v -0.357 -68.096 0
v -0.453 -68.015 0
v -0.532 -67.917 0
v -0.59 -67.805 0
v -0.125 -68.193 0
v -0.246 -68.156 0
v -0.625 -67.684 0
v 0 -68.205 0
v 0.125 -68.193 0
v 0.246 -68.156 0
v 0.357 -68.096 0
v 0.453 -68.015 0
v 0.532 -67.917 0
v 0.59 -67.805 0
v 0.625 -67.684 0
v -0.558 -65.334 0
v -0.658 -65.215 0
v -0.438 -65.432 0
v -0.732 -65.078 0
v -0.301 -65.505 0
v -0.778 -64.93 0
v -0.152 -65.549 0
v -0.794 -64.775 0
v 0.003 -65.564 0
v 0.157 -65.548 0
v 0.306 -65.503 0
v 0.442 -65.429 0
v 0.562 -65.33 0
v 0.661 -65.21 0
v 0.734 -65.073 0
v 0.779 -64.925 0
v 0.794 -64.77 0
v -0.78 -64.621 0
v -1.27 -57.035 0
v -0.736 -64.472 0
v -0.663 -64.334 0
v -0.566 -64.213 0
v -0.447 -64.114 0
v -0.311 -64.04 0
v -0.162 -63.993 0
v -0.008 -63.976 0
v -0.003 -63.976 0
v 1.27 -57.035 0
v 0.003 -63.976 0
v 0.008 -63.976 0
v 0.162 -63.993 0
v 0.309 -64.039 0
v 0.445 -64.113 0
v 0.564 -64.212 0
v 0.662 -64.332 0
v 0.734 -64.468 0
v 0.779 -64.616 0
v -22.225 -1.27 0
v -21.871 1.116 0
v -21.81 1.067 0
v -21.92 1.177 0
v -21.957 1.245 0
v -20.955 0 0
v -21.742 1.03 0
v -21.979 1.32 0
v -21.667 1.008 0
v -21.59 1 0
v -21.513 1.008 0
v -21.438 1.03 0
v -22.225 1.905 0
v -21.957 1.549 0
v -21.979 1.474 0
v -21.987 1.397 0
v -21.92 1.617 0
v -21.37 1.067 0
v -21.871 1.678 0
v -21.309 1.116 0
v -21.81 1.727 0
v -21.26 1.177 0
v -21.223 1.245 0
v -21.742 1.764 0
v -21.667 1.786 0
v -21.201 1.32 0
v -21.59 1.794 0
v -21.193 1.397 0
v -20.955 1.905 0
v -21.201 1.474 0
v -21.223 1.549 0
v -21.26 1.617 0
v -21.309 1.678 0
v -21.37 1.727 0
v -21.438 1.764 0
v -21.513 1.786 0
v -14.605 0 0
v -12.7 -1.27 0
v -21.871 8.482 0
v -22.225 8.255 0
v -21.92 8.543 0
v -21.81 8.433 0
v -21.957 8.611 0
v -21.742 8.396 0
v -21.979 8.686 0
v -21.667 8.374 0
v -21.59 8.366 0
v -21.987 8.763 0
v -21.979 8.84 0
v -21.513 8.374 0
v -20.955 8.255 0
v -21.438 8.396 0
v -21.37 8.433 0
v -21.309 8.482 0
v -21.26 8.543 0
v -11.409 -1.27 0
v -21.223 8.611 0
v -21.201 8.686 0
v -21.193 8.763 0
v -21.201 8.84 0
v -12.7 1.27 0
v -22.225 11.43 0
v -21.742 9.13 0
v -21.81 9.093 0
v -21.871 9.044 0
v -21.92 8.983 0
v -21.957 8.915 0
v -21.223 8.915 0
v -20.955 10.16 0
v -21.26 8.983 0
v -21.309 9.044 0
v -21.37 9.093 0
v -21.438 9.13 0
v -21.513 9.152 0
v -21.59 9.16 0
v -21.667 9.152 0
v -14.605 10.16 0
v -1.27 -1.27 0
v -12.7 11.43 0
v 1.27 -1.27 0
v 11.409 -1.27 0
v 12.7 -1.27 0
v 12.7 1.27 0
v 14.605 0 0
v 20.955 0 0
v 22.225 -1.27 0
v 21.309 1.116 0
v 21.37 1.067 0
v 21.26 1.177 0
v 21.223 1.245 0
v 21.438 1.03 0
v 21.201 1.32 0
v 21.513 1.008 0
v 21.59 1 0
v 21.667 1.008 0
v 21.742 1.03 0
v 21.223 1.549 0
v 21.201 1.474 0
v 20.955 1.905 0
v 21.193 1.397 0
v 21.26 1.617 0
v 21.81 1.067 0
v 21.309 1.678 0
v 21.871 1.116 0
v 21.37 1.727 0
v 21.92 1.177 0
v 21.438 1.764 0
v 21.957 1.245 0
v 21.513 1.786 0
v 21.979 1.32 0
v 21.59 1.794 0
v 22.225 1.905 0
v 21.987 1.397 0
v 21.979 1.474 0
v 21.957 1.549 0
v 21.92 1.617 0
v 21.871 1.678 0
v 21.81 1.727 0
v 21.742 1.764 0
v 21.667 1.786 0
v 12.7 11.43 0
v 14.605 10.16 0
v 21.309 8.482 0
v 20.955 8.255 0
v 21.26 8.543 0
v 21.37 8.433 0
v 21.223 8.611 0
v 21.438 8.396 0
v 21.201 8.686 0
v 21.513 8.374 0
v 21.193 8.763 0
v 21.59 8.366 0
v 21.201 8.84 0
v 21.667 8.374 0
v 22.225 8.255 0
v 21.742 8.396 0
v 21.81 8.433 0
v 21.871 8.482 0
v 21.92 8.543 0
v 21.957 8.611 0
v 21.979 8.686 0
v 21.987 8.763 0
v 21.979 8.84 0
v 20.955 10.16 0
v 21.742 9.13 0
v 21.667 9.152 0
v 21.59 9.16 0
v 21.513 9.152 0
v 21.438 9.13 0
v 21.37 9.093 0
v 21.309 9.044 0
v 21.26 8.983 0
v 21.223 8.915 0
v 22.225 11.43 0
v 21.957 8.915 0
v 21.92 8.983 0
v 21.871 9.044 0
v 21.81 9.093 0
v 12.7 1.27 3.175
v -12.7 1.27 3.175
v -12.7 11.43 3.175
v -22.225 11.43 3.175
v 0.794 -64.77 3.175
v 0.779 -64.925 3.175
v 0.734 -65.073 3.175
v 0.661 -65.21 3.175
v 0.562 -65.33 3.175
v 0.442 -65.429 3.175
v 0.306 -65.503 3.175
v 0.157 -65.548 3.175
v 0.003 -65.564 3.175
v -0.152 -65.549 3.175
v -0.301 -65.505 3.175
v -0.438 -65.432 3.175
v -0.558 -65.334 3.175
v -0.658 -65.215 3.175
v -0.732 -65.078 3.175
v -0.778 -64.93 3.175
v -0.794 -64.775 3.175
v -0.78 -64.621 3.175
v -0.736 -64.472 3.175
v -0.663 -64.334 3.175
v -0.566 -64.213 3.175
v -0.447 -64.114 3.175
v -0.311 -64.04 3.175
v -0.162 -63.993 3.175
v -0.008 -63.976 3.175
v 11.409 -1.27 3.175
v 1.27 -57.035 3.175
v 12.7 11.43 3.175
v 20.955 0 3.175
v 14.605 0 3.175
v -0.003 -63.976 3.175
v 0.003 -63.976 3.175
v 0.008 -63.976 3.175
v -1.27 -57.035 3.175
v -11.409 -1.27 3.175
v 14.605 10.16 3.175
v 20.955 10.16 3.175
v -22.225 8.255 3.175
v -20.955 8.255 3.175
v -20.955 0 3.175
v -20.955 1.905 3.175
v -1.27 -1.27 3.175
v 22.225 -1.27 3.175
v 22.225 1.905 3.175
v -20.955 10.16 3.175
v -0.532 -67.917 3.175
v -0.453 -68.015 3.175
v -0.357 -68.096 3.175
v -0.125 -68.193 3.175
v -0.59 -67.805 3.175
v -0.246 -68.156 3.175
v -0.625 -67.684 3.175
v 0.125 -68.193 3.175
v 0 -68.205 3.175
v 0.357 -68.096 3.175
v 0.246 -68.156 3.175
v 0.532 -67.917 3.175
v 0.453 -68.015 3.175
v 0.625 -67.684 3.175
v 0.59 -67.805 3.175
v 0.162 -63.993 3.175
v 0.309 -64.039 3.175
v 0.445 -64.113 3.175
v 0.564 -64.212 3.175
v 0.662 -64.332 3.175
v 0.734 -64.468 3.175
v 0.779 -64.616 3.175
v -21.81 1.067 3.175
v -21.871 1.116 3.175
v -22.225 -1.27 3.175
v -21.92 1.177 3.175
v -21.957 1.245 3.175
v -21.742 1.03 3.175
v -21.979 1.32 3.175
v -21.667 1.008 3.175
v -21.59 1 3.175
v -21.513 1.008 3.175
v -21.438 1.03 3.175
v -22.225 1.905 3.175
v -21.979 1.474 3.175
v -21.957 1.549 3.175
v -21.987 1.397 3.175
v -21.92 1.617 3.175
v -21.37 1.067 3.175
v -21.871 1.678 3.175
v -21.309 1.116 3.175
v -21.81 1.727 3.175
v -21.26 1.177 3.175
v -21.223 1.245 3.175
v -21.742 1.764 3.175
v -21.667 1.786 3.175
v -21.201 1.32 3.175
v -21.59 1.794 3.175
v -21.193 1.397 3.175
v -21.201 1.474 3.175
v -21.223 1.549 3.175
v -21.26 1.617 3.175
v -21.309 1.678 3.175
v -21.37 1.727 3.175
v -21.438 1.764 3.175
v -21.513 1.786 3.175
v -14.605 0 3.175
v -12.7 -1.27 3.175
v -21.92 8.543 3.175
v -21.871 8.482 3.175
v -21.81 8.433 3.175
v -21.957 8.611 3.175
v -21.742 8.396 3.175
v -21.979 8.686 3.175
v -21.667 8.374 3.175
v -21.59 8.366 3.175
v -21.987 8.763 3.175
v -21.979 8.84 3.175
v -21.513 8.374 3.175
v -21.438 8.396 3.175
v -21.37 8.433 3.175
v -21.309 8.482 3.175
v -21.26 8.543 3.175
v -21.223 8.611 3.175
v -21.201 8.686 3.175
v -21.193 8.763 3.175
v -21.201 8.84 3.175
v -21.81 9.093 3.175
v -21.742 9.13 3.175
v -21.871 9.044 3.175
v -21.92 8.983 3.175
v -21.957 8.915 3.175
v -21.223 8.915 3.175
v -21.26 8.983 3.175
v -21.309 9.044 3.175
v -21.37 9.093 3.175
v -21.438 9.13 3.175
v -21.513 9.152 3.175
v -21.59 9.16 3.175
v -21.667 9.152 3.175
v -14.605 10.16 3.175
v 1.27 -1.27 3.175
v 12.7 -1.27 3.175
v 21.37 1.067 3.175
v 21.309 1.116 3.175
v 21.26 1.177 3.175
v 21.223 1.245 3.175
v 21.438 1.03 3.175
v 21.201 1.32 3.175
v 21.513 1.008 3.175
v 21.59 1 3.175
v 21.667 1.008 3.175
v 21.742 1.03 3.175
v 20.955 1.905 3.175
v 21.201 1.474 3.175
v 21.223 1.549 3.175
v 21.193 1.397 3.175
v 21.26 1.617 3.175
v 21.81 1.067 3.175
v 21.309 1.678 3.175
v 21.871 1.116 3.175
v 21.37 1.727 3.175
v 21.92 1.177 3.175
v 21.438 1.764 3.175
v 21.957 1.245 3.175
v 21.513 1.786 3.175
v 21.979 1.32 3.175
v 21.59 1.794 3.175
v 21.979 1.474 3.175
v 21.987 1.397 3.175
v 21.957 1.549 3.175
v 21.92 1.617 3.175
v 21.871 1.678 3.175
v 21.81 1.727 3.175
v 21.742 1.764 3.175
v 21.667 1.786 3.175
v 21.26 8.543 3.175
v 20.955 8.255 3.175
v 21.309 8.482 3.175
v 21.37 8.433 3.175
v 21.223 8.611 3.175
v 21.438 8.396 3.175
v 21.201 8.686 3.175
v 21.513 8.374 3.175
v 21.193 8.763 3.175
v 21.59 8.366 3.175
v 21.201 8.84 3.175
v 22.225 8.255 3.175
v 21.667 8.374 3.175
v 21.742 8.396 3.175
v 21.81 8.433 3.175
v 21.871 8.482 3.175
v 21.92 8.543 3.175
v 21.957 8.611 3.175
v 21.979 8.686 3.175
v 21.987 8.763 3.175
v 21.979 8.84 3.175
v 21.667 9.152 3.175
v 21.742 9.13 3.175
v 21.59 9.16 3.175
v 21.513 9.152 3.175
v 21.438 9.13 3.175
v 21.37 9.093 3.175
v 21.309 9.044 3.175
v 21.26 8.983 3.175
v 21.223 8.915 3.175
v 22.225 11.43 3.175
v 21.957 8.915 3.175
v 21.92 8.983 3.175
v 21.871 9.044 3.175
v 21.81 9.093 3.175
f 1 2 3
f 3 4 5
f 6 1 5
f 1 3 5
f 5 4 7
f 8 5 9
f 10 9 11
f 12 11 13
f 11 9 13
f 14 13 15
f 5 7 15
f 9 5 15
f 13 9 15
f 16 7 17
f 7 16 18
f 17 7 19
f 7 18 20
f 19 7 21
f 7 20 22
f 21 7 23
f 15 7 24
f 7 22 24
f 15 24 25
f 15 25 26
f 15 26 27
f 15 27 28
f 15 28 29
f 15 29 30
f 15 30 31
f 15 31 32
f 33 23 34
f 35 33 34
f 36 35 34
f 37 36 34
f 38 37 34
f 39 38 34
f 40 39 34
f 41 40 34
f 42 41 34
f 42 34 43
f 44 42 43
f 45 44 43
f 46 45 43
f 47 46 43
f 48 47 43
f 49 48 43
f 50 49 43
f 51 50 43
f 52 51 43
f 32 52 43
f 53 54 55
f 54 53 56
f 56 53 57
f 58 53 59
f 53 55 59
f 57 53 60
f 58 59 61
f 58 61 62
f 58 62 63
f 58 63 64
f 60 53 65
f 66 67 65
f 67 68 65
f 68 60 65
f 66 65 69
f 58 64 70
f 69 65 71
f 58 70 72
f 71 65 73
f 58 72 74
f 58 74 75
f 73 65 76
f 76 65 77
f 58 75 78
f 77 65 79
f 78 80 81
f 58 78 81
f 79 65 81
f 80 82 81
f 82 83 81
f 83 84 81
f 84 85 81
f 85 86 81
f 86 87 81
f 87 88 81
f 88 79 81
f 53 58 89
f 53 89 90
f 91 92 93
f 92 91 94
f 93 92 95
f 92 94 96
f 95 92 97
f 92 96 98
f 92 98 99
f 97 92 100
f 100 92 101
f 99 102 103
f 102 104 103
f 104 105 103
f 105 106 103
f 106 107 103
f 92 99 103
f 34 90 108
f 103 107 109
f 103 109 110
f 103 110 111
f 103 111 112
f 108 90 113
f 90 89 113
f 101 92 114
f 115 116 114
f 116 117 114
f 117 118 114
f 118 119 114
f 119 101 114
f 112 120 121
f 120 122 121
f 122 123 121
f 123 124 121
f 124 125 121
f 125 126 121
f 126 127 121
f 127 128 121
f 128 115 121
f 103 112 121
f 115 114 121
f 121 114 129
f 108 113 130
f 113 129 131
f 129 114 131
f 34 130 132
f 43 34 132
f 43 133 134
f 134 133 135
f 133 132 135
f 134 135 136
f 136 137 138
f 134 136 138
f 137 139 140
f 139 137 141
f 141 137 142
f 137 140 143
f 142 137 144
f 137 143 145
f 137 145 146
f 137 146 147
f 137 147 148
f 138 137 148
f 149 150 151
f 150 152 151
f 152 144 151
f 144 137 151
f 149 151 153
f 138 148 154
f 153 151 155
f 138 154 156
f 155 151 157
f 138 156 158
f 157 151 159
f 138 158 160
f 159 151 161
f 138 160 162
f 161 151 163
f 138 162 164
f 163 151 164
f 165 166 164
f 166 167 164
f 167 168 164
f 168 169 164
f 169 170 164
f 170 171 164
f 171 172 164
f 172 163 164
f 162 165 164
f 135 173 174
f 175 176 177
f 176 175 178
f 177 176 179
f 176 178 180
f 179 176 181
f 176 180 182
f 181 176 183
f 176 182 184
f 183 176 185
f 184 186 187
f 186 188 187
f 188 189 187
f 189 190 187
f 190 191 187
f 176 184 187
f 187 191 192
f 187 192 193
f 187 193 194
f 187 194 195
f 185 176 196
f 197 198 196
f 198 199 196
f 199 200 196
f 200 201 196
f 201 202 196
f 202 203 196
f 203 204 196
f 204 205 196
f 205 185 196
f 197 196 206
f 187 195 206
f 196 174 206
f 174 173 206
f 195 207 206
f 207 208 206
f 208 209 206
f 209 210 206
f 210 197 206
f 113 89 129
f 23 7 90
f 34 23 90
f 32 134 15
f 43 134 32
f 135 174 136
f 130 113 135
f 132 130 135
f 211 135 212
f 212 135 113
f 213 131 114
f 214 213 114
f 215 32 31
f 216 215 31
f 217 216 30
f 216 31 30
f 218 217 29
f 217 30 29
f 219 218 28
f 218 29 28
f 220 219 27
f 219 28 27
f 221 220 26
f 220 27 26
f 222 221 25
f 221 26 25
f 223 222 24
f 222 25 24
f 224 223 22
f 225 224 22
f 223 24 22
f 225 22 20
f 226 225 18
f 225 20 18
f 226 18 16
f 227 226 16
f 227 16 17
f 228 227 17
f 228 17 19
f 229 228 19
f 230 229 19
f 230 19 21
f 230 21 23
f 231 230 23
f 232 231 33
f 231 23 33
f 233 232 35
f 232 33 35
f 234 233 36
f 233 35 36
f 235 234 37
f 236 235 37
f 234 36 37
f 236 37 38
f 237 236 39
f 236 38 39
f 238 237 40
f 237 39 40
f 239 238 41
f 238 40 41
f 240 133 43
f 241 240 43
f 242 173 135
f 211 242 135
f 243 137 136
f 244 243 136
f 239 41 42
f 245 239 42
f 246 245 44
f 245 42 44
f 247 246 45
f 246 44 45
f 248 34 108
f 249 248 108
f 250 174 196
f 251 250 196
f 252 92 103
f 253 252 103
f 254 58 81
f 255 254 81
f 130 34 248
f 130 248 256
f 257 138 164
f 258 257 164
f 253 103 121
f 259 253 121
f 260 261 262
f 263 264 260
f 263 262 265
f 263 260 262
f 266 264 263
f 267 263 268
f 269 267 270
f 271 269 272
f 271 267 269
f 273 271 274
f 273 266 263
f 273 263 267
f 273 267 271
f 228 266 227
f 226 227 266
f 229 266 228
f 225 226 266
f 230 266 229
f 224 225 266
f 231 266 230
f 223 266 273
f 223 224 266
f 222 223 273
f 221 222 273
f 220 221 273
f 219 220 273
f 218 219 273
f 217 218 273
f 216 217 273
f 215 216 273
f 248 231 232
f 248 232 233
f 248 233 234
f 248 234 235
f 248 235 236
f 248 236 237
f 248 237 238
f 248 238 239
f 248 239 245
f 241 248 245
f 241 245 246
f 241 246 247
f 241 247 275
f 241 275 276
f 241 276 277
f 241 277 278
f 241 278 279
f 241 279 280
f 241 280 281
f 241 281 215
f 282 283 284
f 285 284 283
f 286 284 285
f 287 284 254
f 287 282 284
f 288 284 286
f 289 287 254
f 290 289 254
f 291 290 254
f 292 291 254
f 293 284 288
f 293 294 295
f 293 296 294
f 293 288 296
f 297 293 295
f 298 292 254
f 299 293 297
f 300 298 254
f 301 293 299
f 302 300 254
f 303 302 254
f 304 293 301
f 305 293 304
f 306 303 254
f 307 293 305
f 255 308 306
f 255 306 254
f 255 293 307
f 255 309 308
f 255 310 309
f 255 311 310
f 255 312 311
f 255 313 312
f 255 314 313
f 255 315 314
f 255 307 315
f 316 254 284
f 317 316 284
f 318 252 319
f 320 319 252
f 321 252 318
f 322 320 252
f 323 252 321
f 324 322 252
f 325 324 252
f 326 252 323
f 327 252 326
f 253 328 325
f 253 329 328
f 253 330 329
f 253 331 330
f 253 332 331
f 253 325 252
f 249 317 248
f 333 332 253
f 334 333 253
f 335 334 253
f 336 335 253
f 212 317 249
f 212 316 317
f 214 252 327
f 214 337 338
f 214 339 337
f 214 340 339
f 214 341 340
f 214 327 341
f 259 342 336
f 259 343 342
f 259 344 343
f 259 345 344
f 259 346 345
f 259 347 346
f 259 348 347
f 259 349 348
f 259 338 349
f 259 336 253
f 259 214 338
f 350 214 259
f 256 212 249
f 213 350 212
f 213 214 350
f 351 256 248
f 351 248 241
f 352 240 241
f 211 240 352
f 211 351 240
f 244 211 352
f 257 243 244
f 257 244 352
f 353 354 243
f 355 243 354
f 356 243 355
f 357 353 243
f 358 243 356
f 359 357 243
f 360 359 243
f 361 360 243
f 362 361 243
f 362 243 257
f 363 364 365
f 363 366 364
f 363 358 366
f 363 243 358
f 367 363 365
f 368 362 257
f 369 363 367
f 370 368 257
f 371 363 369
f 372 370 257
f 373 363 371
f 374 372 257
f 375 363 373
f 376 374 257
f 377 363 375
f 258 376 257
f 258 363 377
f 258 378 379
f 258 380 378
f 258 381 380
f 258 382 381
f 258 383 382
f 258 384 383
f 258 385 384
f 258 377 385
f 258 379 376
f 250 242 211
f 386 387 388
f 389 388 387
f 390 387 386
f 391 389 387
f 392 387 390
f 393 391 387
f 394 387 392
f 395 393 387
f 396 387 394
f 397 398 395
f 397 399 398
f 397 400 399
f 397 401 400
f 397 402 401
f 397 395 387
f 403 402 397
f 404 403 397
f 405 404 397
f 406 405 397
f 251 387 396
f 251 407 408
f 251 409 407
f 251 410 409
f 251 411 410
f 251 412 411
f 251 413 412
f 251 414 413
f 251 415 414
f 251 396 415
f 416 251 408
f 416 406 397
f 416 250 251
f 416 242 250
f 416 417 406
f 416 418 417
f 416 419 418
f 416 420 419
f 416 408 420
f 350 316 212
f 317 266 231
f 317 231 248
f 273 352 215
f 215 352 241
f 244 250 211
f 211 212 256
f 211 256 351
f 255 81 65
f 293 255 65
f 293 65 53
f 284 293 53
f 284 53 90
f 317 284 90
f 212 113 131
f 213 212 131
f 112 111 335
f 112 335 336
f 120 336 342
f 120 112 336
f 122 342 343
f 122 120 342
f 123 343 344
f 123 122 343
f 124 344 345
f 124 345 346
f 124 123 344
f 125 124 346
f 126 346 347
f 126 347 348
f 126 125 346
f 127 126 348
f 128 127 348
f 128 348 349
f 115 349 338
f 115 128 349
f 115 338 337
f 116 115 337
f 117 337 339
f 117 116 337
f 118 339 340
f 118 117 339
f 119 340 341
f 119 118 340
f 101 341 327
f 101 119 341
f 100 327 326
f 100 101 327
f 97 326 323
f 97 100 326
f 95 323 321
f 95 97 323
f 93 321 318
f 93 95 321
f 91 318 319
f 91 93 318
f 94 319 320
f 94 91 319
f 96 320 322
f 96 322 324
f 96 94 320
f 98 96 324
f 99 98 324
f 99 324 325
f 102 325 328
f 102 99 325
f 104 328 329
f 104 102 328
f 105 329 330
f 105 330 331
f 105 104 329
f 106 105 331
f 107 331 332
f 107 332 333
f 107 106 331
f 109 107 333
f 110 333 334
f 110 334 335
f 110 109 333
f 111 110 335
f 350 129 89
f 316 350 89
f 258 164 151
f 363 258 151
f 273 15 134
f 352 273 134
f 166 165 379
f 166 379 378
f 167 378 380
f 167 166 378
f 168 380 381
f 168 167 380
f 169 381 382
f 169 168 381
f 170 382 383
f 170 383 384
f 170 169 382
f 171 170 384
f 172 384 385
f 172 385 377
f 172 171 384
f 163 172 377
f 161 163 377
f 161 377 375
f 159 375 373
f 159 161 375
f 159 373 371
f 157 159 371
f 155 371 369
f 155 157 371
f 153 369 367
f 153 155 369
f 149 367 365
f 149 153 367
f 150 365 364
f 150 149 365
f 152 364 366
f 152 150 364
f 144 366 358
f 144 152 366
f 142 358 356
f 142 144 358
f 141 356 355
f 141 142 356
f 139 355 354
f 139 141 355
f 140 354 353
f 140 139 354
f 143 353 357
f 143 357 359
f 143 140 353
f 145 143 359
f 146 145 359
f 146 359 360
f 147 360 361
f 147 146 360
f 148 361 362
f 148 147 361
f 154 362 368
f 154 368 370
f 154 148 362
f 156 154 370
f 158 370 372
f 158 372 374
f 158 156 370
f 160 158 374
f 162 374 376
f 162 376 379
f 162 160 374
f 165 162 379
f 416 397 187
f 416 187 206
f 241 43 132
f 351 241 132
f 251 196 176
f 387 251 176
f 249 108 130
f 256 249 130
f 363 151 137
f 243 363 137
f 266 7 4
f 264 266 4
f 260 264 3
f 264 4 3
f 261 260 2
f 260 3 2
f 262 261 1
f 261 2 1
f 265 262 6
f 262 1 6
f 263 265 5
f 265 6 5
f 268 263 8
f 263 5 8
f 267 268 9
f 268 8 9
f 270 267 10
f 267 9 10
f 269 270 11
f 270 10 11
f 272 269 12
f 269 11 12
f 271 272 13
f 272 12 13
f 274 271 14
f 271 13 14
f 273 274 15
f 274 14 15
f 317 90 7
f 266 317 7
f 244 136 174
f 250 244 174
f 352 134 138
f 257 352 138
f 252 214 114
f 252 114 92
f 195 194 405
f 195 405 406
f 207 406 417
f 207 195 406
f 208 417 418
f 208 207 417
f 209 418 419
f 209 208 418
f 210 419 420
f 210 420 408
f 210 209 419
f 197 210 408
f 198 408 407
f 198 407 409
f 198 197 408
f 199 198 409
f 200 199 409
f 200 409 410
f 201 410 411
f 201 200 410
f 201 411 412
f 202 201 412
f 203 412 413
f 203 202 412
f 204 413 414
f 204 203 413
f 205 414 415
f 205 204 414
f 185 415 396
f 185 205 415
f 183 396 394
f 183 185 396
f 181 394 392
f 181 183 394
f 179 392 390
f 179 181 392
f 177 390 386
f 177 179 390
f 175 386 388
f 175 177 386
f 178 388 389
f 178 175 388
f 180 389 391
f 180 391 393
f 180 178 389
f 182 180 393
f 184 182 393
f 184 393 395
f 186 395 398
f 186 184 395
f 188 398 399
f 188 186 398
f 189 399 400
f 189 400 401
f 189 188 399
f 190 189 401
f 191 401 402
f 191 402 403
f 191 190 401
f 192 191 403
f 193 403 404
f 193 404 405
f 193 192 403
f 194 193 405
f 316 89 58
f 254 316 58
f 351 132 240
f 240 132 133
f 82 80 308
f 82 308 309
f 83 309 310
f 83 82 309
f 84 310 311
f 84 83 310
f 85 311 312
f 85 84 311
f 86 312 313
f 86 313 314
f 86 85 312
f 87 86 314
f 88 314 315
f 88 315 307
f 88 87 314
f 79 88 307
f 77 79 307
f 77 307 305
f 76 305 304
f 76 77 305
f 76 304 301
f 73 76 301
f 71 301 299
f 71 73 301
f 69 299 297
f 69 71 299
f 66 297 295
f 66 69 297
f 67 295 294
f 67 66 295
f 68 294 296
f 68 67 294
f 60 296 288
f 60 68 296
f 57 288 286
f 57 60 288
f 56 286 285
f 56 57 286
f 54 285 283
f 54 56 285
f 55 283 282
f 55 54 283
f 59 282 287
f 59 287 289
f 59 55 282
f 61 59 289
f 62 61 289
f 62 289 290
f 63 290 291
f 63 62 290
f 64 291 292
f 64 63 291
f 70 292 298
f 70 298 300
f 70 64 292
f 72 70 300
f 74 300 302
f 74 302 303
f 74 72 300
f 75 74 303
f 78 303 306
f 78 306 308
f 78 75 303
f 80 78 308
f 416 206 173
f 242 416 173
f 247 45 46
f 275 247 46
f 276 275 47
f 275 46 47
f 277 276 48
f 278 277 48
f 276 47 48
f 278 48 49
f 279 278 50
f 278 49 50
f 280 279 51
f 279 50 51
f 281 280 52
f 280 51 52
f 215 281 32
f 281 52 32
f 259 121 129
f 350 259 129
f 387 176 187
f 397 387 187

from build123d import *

# Parameters (mm, degrees)
F0_R     = 0.396875
F0_W     = 2.54
F0_H     = 55.765484
F1_DEPTH = 3.175


with BuildPart() as f1:
    # F0 (on Top) → F1 (new body)
    with BuildSketch(Plane.XY):
        Polygon((-12.7, 11.43), (-22.225, 11.43), (-22.225, 8.255), (-20.955, 8.255), (-20.955, 10.16), (-14.605, 10.16), (-14.605, 0), (-20.955, 0), (-20.955, 1.905), (-22.225, 1.905), (-22.225, -1.27), (-12.7, -1.27), (-12.7, 1.27), align=None)
        with Locations((-21.59, 1.397)):
            Circle(F0_R, mode=Mode.SUBTRACT)
        with Locations((-21.59, 8.763)):
            Circle(F0_R, mode=Mode.SUBTRACT)
        Polygon((12.7, 1.27), (-12.7, 1.27), (-12.7, -1.27), (-11.409179, -1.27), (-1.27, -1.27), (1.27, -1.27), (11.409179, -1.27), (12.7, -1.27), align=None)
        Polygon((12.7, 11.43), (12.7, 1.27), (12.7, -1.27), (22.225, -1.27), (22.225, 1.905), (20.955, 1.905), (20.955, 0), (14.605, 0), (14.605, 10.16), (20.955, 10.16), (20.955, 8.255), (22.225, 8.255), (22.225, 11.43), align=None)
        with Locations((21.59, 1.397)):
            Circle(F0_R, mode=Mode.SUBTRACT)
        with Locations((21.59, 8.763)):
            Circle(F0_R, mode=Mode.SUBTRACT)
        with BuildLine():
            Line((-11.409179, -1.27), (-12.7, -1.27))
            Line((-12.7, -1.27), (-0.624757, -67.683834))
            ThreePointArc((-0.624757, -67.683834), (0, -68.205242), (0.624757, -67.683834))
            Line((0.624757, -67.683834), (12.7, -1.27))
            Line((12.7, -1.27), (11.409179, -1.27))
            Line((11.409179, -1.27), (1.27, -57.035484))
            Line((1.27, -57.035484), (0.008035, -63.976291))
            ThreePointArc((0.008035, -63.976291), (0.5641, -64.211582), (0.79375, -64.77))
            ThreePointArc((0.79375, -64.77), (-0.558418, -65.3341), (-0.008035, -63.976291))
            Line((-0.008035, -63.976291), (-1.27, -57.035484))
            Line((-1.27, -57.035484), (-11.409179, -1.27))
        make_face()
        with Locations((0, -29.152742)):
            Rectangle(F0_W, F0_H)
        with BuildLine():
            Line((1.27, -57.035484), (-1.27, -57.035484))
            Line((-1.27, -57.035484), (-0.008035, -63.976291))
            ThreePointArc((-0.008035, -63.976291), (0, -63.97625), (0.008035, -63.976291))
            Line((0.008035, -63.976291), (1.27, -57.035484))
        make_face()
    extrude(amount=F1_DEPTH)


solid = f1.part
